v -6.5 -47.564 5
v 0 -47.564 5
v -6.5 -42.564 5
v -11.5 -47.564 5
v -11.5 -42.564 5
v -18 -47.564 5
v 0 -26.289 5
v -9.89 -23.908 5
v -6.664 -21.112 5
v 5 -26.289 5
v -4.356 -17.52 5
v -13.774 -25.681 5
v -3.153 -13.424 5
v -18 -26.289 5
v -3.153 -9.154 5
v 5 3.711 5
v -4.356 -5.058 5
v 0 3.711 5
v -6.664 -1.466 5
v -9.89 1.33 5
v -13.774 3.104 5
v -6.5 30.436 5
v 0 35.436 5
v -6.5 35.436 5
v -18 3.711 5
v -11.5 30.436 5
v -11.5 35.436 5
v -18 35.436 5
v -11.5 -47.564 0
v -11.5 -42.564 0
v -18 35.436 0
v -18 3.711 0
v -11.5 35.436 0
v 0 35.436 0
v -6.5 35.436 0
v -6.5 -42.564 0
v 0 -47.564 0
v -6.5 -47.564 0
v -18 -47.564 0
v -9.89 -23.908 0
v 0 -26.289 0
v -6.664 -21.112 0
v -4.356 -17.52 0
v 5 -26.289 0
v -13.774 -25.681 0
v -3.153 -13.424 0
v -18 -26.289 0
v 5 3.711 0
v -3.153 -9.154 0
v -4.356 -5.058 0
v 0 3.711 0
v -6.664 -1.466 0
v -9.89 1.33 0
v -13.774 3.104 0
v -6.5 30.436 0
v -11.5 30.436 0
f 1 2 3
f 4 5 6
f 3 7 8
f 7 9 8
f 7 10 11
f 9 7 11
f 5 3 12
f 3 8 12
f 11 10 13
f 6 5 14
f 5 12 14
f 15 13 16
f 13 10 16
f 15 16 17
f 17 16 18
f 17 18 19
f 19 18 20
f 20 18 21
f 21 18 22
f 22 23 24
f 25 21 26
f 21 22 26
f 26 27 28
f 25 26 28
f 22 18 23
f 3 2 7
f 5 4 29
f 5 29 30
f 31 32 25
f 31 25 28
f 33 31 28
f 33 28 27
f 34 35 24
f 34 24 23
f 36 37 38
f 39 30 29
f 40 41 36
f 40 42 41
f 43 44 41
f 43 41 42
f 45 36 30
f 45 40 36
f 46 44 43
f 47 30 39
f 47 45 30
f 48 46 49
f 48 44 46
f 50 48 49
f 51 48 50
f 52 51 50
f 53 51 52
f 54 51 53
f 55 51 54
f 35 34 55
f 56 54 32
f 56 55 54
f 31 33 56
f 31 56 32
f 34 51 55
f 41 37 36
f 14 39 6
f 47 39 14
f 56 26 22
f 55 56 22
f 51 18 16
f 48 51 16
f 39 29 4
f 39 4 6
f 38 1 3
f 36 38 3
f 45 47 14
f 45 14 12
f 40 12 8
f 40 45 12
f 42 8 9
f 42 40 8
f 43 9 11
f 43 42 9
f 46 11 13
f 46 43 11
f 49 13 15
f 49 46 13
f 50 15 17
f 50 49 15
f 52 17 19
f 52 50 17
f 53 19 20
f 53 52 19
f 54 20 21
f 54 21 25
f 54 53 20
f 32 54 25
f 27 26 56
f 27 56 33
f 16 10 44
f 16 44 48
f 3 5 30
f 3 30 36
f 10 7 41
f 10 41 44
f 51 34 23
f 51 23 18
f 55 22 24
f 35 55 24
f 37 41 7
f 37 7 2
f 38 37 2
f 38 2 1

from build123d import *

# Parameters (mm, degrees)
BOSS_EXTRU_1_DEPTH      = 5
ESQUISSE2_W             = 5
ESQUISSE2_H             = 5
ENL_V_MAT_EXTRU_1_DEPTH = 5
ESQUISSE3_W             = 5
ESQUISSE3_H             = 30
BOSS_EXTRU_2_DEPTH      = 5


with BuildPart() as part:
    # Esquisse1 → Boss.-Extru.1 (new body)
    with BuildSketch(Plane.XY):
        with BuildLine():
            Line((-18, 35.436143593), (0, 35.436143593))
            Line((0, 35.436143593), (0, -47.563856407))
            Line((0, -47.563856407), (-18, -47.563856407))
            Line((-18, -47.563856407), (-18, -26.288856407))
            ThreePointArc((-18, -26.288856407), (-3, -11.288856407), (-18, 3.711143593))
            Line((-18, 3.711143593), (-18, 35.436143593))
        make_face()
    extrude(amount=BOSS_EXTRU_1_DEPTH)

    # Esquisse2 → Enlèv. mat.-Extru.1 (cut)
    with BuildSketch(Plane.XY.offset(5)):
        with Locations((-9, 32.936143593)):
            Rectangle(ESQUISSE2_W, ESQUISSE2_H)
        with Locations((-9, -45.063856407)):
            Rectangle(ESQUISSE2_W, ESQUISSE2_H)
    extrude(amount=-ENL_V_MAT_EXTRU_1_DEPTH, mode=Mode.SUBTRACT)

    # Esquisse3 → Boss.-Extru.2 (add)
    with BuildSketch(Plane.XY.offset(5)):
        with Locations((2.5, -11.288856407)):
            Rectangle(ESQUISSE3_W, ESQUISSE3_H)
    extrude(amount=-BOSS_EXTRU_2_DEPTH)


solid = part.part
